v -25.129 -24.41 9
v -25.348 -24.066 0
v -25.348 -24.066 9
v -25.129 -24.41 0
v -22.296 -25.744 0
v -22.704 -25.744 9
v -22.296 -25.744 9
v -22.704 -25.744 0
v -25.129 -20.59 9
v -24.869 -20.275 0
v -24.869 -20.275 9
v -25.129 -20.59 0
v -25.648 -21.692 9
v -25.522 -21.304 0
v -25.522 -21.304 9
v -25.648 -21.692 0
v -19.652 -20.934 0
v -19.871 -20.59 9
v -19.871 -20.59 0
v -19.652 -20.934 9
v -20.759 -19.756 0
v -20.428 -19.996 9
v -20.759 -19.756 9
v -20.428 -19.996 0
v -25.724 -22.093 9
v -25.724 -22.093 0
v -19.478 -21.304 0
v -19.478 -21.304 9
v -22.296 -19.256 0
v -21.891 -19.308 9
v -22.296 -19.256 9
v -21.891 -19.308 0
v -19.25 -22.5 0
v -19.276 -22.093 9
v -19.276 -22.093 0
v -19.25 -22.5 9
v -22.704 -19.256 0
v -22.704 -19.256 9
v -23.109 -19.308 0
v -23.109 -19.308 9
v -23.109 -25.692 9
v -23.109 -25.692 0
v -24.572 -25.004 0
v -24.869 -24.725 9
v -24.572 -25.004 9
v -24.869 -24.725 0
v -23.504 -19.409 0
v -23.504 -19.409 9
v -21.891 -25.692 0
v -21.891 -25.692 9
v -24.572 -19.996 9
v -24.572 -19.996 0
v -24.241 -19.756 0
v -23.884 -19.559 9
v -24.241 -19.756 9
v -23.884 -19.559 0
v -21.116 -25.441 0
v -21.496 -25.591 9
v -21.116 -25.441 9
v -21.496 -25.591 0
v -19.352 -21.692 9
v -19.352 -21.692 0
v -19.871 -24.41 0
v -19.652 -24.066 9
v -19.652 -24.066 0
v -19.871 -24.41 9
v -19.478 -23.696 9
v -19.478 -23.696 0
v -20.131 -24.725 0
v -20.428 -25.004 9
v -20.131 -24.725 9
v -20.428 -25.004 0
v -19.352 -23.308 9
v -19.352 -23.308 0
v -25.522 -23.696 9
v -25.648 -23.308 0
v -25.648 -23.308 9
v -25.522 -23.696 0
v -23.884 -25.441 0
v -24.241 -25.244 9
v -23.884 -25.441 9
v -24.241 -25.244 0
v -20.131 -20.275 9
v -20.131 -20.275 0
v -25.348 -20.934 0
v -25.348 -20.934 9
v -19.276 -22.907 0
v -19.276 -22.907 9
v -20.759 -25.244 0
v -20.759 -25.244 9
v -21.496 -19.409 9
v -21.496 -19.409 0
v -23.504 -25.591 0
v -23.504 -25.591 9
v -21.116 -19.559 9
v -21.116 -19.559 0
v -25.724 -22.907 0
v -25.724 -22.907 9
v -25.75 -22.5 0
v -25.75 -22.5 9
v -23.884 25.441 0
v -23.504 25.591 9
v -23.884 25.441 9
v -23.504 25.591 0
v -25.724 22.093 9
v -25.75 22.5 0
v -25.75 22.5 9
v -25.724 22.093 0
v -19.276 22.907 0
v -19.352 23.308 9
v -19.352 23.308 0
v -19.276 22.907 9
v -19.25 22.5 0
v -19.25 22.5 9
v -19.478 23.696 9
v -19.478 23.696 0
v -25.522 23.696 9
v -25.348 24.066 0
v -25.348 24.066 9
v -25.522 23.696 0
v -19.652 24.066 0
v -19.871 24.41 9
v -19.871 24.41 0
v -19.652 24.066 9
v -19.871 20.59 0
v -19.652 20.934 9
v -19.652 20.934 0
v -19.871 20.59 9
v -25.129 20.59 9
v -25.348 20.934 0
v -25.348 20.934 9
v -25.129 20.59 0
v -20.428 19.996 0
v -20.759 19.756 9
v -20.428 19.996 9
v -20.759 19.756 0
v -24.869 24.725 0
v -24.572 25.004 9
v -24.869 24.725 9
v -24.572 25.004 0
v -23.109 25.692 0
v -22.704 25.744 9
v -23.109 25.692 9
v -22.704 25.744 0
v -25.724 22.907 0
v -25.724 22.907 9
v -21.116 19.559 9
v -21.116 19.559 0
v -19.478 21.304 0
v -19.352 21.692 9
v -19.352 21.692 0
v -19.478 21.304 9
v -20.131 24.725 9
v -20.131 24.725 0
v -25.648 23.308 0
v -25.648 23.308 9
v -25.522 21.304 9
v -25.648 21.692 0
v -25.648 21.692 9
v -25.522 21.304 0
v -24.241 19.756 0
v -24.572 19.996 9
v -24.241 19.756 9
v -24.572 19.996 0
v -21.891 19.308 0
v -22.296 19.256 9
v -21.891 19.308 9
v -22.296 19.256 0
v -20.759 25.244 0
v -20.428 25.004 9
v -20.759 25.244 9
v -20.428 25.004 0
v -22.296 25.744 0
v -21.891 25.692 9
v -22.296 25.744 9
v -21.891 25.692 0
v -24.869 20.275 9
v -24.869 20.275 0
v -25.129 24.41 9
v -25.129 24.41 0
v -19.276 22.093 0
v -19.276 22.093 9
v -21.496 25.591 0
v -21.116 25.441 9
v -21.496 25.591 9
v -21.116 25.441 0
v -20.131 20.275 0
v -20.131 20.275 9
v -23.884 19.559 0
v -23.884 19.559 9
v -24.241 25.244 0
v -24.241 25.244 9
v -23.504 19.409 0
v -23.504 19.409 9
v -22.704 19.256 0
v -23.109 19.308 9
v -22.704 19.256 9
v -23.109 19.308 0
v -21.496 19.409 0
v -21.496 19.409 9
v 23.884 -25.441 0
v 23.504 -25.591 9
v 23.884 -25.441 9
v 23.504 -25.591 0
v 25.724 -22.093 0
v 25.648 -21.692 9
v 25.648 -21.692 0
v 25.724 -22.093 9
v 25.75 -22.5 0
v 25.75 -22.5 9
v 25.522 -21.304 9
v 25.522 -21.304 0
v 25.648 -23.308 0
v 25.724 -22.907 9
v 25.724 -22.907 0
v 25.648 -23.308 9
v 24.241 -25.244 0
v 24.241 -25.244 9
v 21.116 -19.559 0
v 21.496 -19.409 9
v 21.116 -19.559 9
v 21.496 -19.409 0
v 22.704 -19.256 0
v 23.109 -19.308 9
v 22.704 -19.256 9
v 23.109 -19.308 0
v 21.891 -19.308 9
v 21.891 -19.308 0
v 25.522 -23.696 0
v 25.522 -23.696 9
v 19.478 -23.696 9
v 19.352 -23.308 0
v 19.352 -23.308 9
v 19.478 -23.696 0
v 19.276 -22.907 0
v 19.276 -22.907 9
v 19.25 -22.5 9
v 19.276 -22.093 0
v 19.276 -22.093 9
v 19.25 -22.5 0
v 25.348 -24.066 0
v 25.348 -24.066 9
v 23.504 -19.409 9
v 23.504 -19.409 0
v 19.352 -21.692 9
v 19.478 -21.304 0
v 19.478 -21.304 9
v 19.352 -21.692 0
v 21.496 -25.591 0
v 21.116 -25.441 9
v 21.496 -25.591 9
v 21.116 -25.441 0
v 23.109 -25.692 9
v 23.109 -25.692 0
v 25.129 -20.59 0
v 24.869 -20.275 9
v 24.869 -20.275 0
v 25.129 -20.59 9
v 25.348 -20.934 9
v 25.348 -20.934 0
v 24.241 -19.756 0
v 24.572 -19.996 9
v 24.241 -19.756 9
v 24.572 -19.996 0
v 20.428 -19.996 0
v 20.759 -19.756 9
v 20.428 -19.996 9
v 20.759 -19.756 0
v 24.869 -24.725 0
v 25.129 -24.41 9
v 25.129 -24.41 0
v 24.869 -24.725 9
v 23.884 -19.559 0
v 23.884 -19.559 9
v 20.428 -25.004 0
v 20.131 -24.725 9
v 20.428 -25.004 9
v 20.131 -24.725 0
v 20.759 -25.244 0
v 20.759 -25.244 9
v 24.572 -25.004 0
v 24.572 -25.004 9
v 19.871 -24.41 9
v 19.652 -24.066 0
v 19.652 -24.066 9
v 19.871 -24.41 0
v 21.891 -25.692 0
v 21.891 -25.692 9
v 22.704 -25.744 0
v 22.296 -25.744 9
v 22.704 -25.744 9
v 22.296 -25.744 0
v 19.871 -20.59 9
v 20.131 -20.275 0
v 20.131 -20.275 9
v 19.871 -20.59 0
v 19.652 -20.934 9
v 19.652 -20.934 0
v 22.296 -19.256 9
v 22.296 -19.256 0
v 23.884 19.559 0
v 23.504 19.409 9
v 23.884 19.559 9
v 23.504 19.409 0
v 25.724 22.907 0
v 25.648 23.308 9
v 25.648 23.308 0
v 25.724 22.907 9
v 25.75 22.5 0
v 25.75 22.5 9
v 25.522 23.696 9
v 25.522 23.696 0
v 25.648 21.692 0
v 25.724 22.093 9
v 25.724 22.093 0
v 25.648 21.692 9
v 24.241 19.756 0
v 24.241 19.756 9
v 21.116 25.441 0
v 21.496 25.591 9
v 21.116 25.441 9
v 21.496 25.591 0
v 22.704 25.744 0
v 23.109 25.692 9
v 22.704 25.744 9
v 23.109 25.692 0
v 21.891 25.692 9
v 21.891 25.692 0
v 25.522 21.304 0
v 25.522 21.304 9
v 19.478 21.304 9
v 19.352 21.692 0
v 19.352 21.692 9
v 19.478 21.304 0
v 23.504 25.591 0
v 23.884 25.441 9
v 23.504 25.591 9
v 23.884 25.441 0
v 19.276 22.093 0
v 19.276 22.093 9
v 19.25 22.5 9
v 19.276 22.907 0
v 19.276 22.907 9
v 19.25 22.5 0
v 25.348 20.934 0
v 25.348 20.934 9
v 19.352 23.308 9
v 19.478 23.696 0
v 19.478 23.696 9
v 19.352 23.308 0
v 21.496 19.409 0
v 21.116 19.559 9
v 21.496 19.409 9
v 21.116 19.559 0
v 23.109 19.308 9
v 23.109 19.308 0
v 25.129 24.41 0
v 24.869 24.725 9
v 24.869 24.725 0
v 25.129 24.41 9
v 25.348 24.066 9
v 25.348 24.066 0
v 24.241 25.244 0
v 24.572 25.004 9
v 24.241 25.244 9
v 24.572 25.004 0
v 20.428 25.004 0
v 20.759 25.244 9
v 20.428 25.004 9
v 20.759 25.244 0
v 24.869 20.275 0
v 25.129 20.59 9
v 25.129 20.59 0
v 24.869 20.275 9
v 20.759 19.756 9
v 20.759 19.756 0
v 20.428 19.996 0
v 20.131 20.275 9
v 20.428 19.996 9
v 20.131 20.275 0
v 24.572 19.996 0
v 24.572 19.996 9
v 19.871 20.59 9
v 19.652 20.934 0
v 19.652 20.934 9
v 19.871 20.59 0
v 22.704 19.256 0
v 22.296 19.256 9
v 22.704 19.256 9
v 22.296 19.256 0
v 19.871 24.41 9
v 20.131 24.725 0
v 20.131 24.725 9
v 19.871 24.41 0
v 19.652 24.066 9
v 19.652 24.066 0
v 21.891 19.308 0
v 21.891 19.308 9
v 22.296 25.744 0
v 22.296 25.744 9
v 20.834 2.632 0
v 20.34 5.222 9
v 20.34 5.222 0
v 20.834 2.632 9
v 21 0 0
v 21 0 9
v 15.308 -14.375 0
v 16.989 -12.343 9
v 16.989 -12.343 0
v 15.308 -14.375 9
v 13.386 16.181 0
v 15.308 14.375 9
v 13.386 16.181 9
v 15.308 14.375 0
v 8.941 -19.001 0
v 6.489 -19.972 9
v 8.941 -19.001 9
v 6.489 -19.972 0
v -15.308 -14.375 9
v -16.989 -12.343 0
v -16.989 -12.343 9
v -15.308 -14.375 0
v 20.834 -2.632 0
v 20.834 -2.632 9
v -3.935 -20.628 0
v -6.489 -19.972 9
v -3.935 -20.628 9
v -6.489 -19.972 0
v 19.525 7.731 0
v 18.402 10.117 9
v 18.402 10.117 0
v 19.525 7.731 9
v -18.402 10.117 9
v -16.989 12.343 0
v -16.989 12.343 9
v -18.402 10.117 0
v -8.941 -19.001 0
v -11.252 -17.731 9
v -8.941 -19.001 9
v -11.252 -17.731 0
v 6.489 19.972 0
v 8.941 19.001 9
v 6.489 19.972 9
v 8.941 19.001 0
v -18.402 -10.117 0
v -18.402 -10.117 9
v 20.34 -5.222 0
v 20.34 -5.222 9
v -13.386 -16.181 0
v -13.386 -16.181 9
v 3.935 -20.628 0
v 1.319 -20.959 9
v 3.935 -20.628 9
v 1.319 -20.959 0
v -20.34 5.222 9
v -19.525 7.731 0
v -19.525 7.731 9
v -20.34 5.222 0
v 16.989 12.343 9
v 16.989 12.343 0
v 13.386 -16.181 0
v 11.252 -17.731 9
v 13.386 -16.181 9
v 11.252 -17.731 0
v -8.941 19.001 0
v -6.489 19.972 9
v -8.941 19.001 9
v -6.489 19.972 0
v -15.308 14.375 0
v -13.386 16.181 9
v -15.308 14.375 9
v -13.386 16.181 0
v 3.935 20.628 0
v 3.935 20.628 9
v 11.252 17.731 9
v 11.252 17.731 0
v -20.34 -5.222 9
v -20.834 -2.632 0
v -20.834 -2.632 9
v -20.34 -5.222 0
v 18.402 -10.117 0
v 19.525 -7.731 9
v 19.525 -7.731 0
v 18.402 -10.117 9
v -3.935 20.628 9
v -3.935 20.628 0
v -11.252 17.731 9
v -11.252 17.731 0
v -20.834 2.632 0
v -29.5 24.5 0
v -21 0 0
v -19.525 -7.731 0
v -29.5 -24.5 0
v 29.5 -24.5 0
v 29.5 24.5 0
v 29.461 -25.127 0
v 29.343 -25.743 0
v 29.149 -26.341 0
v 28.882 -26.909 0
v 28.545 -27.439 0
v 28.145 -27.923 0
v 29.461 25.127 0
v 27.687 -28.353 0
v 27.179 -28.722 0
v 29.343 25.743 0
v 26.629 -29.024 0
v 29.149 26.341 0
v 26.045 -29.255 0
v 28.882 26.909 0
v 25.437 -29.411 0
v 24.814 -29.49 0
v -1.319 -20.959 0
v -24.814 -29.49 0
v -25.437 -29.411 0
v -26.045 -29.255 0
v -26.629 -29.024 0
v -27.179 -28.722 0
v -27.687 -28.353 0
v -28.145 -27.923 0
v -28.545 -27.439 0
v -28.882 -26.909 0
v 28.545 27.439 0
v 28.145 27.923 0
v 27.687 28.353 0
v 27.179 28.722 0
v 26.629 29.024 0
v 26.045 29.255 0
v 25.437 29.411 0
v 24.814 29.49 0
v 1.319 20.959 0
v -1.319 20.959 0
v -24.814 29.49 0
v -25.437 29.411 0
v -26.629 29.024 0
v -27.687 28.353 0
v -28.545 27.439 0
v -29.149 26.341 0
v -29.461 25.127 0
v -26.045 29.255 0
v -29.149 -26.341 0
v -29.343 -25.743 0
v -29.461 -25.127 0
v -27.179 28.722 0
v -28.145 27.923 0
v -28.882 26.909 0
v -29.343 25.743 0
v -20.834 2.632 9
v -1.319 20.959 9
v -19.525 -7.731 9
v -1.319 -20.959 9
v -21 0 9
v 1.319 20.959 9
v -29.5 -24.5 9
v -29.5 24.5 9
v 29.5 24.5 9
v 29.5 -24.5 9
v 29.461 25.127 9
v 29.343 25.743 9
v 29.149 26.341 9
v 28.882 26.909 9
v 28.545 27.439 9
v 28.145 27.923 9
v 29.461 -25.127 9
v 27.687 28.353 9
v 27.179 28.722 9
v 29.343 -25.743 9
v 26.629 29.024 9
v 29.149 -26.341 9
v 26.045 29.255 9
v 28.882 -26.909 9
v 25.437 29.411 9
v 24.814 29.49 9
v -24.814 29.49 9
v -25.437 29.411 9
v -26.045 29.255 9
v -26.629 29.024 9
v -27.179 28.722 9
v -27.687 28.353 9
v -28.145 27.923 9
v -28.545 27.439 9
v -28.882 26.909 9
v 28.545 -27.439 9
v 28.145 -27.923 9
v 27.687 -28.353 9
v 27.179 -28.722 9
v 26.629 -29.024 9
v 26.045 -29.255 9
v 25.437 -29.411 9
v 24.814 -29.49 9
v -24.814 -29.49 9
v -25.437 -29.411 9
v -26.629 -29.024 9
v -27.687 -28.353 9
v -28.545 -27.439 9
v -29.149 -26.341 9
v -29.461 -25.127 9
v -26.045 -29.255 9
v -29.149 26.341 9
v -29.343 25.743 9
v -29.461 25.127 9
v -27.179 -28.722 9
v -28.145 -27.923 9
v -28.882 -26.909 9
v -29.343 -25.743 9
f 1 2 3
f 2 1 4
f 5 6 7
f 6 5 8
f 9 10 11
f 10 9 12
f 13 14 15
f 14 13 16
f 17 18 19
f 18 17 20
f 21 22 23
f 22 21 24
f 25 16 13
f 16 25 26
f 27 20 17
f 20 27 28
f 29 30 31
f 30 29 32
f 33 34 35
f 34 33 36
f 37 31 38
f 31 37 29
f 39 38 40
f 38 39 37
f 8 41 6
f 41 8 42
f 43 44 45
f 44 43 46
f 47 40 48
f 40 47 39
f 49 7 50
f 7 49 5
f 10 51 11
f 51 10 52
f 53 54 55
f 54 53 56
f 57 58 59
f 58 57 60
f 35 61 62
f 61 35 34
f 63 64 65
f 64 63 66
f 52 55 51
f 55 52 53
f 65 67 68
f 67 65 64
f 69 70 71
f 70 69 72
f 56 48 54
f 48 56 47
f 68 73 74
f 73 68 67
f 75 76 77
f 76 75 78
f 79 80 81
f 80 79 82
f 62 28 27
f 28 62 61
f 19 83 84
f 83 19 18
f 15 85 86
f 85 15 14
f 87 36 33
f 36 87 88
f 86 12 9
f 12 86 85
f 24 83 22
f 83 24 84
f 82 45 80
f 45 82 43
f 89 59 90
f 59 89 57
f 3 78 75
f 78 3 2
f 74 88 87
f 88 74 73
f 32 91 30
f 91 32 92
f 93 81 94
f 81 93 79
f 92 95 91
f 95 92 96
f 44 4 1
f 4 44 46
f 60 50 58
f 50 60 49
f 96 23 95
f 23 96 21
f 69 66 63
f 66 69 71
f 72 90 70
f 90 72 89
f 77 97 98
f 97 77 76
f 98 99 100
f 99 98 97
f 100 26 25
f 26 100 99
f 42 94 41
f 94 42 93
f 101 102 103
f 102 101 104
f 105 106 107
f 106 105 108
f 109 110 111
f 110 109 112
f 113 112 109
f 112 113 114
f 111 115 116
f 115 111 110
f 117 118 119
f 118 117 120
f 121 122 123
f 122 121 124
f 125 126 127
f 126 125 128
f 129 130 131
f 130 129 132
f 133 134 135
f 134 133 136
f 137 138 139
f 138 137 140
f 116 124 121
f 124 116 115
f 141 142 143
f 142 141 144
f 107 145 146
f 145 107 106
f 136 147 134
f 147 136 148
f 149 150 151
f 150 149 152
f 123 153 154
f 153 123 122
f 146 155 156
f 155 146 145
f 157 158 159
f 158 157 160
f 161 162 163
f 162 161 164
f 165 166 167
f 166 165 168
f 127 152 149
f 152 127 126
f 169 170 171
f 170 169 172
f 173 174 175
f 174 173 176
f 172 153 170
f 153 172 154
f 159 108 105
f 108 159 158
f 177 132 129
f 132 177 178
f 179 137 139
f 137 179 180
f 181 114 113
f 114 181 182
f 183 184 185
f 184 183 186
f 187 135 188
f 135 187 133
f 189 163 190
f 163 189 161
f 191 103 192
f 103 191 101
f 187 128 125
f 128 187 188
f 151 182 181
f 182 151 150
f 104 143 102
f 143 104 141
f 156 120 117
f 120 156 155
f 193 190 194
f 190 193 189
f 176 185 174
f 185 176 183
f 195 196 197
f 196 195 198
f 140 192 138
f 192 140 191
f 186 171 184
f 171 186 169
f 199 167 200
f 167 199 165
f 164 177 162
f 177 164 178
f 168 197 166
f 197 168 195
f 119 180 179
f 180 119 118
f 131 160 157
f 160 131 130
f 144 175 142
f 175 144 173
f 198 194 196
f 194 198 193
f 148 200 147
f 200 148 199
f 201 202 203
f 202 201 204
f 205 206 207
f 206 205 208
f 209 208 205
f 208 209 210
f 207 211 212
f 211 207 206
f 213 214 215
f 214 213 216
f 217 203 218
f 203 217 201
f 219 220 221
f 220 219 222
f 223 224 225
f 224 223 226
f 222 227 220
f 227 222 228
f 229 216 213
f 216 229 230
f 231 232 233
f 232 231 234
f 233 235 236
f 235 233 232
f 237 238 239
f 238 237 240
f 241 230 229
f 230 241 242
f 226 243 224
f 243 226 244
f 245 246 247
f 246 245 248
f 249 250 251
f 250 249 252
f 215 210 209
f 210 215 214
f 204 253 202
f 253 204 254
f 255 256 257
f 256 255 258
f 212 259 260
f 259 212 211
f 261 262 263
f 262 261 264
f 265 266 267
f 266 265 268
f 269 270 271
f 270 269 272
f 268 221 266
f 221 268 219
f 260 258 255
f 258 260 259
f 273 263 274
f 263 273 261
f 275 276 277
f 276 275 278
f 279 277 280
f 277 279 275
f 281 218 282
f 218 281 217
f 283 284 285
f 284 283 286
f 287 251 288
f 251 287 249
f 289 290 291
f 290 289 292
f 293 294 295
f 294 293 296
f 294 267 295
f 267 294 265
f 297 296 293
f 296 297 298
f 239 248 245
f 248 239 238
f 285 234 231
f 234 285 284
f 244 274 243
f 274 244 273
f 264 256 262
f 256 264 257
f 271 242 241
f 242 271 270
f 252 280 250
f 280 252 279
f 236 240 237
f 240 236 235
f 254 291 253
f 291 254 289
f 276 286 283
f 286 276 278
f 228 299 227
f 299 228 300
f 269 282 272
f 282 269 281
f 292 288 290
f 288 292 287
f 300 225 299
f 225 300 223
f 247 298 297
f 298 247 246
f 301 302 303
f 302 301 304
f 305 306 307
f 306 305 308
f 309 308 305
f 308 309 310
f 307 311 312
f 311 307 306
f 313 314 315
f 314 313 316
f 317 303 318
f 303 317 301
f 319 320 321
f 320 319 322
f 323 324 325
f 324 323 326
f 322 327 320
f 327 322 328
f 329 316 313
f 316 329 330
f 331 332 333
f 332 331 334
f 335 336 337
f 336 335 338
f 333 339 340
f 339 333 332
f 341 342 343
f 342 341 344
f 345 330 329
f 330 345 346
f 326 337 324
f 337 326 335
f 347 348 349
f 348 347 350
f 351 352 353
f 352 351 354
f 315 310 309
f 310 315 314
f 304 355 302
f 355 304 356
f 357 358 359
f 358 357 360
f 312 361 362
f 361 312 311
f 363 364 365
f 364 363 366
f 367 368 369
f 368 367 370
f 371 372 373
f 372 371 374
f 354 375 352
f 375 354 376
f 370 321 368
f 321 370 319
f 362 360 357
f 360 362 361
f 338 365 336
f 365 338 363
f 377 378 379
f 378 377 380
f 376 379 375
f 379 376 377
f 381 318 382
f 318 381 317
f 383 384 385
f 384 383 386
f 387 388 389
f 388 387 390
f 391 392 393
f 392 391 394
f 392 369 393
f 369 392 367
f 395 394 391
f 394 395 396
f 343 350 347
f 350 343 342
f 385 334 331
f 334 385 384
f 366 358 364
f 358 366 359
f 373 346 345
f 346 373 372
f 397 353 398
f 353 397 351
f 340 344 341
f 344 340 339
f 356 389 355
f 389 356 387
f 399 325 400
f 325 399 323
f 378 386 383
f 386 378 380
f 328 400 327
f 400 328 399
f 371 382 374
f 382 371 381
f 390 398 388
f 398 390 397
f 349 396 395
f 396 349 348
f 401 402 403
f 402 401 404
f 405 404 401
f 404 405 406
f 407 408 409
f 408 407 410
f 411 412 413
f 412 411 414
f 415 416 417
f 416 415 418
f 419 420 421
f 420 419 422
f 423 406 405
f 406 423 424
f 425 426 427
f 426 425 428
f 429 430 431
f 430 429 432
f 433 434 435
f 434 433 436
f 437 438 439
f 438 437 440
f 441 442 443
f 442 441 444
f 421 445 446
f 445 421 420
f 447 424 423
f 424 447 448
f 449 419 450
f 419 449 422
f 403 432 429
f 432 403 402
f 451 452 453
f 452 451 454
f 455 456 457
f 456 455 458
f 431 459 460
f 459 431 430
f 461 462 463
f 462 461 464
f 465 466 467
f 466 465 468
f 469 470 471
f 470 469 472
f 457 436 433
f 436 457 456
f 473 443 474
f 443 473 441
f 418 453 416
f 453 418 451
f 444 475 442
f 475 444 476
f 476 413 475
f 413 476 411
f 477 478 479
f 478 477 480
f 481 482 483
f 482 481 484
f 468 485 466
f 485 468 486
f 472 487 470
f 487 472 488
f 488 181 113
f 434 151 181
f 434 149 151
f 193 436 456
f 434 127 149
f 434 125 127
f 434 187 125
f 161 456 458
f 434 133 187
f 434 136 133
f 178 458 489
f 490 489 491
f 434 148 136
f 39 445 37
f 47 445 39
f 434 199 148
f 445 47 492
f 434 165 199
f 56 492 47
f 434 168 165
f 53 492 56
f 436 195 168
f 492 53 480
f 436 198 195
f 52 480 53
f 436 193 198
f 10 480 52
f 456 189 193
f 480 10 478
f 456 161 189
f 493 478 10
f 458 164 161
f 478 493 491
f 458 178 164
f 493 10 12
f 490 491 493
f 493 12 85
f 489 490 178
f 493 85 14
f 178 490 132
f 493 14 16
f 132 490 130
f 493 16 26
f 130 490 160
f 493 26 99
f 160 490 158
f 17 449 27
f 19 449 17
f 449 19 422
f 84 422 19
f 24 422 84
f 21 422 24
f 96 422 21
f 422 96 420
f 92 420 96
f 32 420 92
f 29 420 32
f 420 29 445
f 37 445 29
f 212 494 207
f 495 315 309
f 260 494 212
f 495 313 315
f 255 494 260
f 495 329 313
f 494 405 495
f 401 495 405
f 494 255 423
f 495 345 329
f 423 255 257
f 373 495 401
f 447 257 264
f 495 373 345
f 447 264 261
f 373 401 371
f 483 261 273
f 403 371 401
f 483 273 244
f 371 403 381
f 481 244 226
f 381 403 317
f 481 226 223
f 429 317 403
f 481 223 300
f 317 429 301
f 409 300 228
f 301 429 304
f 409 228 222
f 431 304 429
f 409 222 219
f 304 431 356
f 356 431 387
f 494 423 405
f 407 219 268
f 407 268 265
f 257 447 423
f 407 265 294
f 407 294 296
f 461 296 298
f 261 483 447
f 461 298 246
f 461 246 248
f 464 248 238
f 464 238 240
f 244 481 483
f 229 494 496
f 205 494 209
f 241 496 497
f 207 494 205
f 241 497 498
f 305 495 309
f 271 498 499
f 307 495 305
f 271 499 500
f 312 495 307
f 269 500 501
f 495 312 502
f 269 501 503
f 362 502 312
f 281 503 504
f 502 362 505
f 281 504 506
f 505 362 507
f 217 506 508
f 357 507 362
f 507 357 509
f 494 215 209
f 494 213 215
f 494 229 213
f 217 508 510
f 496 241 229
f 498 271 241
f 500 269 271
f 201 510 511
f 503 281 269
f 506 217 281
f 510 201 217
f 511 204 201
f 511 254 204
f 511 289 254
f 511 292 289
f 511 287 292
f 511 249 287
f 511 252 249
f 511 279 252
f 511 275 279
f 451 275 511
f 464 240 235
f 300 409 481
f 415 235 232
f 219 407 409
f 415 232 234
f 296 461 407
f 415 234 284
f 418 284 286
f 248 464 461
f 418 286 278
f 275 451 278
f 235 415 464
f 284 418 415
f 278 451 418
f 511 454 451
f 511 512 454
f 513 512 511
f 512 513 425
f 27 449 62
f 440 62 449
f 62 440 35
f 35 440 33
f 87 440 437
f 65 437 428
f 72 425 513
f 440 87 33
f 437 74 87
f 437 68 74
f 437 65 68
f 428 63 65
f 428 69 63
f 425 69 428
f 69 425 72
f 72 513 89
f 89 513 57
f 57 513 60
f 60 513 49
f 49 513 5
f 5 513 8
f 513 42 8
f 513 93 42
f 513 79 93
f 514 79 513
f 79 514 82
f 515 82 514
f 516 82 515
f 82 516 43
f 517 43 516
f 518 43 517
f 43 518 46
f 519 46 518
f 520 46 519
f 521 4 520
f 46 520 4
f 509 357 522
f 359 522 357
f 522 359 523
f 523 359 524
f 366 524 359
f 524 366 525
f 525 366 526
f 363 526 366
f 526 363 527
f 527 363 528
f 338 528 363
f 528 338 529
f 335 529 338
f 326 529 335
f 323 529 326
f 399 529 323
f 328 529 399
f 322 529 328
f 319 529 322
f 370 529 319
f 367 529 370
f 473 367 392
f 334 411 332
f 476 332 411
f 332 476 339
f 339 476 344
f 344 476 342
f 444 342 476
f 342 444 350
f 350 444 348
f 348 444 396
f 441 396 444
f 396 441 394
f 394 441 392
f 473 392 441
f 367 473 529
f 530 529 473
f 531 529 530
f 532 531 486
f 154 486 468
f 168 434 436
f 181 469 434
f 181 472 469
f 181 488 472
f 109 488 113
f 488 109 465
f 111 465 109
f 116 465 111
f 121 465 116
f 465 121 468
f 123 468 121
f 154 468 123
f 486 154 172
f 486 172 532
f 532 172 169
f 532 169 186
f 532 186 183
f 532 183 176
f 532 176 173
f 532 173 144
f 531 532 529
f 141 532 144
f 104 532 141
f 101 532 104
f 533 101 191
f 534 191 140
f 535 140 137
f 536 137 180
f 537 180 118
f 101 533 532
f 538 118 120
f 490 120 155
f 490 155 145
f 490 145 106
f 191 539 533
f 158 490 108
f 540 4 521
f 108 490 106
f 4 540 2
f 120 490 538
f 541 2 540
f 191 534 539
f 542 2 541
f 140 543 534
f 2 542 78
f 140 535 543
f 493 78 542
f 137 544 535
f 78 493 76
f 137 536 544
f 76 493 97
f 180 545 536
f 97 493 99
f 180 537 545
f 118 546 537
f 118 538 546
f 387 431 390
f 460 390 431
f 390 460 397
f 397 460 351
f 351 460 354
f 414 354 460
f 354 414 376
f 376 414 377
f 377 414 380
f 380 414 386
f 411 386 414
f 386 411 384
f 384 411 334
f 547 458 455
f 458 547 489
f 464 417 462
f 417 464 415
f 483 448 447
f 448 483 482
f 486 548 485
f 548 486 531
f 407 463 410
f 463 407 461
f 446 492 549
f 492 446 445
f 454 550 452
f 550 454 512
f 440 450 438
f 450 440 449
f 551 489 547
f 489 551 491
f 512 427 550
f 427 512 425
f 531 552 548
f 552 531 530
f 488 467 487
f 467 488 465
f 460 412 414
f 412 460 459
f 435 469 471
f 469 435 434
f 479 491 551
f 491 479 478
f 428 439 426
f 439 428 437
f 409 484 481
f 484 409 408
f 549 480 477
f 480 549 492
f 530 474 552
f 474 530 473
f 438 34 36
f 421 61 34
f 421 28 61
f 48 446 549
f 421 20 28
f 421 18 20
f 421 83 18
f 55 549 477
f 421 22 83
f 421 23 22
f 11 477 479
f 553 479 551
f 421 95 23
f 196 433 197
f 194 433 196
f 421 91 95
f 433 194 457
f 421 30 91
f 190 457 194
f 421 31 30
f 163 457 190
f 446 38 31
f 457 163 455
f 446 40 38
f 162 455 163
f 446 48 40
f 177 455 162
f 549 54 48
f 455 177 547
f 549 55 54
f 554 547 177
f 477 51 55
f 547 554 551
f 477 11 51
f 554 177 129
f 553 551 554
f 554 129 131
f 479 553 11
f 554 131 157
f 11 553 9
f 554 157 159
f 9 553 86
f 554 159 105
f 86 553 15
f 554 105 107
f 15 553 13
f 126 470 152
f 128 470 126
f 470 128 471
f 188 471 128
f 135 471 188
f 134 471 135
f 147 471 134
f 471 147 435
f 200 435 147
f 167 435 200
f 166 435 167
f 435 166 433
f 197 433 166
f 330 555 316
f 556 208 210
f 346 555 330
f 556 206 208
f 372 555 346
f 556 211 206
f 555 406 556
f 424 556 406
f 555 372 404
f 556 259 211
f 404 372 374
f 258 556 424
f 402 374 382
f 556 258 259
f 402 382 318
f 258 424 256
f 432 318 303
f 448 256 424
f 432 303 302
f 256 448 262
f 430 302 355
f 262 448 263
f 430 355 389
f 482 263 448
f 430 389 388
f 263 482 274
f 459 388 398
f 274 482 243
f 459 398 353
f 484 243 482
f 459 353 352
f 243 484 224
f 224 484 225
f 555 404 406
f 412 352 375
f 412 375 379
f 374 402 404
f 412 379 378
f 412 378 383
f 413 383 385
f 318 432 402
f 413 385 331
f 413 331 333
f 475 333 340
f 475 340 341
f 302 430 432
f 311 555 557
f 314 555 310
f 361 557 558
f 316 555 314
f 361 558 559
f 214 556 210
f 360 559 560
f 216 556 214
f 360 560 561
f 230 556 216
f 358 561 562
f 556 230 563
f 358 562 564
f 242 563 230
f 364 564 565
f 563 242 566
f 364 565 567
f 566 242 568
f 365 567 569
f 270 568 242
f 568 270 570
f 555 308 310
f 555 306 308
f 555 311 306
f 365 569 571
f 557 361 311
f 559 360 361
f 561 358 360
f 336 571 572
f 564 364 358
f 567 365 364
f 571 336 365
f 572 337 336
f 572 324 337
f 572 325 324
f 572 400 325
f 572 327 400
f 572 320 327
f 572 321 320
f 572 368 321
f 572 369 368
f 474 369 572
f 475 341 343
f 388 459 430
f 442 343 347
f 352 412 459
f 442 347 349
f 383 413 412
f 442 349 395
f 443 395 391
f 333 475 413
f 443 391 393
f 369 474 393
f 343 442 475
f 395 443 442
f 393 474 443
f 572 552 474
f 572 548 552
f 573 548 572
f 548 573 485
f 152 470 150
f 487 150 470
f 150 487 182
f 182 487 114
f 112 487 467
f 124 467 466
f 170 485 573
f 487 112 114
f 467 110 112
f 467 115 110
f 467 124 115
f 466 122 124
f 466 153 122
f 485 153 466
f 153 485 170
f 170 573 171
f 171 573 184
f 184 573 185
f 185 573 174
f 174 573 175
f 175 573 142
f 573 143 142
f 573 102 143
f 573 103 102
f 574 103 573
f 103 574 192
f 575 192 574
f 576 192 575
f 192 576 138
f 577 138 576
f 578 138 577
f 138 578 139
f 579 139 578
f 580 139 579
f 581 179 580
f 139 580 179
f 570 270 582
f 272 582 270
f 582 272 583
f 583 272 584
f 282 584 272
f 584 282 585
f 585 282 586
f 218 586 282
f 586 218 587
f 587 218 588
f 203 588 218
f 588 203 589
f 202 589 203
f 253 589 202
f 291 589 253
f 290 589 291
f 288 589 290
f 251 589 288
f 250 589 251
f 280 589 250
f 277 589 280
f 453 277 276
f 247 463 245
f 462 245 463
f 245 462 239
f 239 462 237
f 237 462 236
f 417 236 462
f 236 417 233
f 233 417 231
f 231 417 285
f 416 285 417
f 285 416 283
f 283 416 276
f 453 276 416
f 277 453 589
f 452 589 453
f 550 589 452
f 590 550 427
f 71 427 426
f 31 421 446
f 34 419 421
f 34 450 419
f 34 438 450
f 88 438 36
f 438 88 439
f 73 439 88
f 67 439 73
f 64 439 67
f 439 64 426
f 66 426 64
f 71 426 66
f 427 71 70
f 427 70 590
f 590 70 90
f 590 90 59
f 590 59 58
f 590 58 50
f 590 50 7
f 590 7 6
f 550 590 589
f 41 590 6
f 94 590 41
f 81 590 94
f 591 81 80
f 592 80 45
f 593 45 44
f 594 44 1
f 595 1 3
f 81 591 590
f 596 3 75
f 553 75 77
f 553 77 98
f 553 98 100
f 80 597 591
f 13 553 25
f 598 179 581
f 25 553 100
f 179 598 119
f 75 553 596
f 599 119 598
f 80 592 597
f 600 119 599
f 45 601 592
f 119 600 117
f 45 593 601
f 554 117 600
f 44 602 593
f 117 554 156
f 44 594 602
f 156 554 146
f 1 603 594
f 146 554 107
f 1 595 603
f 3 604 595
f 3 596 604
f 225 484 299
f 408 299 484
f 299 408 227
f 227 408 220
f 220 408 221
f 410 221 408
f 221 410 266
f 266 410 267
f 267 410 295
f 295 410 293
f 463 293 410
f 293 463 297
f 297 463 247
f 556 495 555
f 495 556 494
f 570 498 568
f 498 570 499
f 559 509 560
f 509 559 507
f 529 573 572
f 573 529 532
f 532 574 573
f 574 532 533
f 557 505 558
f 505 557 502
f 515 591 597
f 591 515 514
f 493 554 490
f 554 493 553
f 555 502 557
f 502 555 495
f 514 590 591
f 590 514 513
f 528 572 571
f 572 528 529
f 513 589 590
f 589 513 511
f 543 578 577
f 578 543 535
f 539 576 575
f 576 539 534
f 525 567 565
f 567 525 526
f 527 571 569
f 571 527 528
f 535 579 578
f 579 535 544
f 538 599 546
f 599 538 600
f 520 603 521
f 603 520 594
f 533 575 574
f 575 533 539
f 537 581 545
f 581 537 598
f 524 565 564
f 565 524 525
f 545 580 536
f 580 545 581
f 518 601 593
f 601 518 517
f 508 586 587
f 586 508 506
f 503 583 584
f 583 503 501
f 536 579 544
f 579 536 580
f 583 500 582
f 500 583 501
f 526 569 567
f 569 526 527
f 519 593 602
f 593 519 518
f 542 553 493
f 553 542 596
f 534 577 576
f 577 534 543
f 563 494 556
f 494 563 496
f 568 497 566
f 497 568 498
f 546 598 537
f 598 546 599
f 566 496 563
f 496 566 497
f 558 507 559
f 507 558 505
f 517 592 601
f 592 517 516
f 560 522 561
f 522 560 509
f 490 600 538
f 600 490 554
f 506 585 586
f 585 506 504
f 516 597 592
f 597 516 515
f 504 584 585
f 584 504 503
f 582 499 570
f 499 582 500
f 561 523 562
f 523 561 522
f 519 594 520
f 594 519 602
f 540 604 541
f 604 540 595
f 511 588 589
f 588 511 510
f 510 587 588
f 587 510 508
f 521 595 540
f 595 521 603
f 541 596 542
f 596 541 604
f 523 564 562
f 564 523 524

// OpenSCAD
$fn = 50;


difference() {
	union() {
		hull() {
			translate(v = [-24.5000000000, 24.5000000000, 0]) {
				cylinder(h = 9, r = 5);
			}
			translate(v = [24.5000000000, 24.5000000000, 0]) {
				cylinder(h = 9, r = 5);
			}
			translate(v = [-24.5000000000, -24.5000000000, 0]) {
				cylinder(h = 9, r = 5);
			}
			translate(v = [24.5000000000, -24.5000000000, 0]) {
				cylinder(h = 9, r = 5);
			}
		}
	}
	union() {
		#translate(v = [-22.5000000000, -22.5000000000, -100.0000000000]) {
			cylinder(h = 200, r = 3.2500000000);
		}
		#translate(v = [-22.5000000000, 22.5000000000, -100.0000000000]) {
			cylinder(h = 200, r = 3.2500000000);
		}
		#translate(v = [22.5000000000, -22.5000000000, -100.0000000000]) {
			cylinder(h = 200, r = 3.2500000000);
		}
		#translate(v = [22.5000000000, 22.5000000000, -100.0000000000]) {
			cylinder(h = 200, r = 3.2500000000);
		}
		#cylinder(h = 9, r = 21.0000000000);
	}
}
